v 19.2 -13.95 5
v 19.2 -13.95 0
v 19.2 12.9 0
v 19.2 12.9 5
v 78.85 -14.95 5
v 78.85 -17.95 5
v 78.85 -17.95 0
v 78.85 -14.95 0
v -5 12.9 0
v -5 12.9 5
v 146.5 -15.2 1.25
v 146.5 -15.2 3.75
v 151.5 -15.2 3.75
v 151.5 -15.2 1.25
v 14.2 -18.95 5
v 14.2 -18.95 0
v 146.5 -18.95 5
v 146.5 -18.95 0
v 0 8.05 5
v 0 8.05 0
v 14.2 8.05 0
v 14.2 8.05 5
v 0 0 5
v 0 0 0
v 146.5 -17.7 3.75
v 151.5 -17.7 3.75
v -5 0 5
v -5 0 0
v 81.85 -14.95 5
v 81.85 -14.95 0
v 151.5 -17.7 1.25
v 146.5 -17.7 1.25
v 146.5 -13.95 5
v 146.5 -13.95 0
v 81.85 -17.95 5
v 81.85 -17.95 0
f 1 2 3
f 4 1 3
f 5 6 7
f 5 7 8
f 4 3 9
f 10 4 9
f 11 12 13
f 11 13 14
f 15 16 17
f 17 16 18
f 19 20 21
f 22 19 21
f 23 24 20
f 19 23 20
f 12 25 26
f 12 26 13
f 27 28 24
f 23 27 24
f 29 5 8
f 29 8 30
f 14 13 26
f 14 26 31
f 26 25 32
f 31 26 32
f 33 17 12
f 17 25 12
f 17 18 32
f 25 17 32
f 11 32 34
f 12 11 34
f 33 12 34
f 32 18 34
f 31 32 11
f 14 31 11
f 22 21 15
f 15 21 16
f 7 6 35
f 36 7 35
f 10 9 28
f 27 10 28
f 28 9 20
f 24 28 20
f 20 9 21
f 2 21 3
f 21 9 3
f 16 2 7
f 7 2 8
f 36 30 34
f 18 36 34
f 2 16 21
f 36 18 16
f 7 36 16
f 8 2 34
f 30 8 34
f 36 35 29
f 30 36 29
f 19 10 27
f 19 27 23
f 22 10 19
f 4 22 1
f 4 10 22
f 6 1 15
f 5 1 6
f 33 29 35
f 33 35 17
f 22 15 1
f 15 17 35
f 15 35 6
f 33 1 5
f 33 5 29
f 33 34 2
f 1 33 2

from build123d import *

# Parameters (mm, degrees)
BOSS_EXTRUDE1_DEPTH = 5
SKETCH2_W           = 2.5
SKETCH2_H           = 2.5
BOSS_EXTRUDE2_DEPTH = 5
SKETCH3_W           = 3
SKETCH3_H           = 3
CUT_EXTRUDE1_DEPTH  = 21


with BuildPart() as part:
    # Sketch1 → Boss-Extrude1 (new body)
    with BuildSketch(Plane.XY):
        Polygon((0, 6.7), (0, 8.05), (5.5, 8.05), (14.2, 8.05), (14.2, -18.95), (146.5, -18.95), (146.5, -13.95), (19.2, -13.95), (19.2, 12.9), (5.5, 12.9), (-5, 12.9), (-5, 0), (0, 0), align=None)
    extrude(amount=BOSS_EXTRUDE1_DEPTH)

    # Sketch2 → Boss-Extrude2 (add)
    with BuildSketch(Plane(origin=(146.5, 0, 0), x_dir=(0, 0, -1), z_dir=(1, 0, 0))):
        with Locations((-2.5, -16.45)):
            Rectangle(SKETCH2_W, SKETCH2_H)
    extrude(amount=BOSS_EXTRUDE2_DEPTH)

    # Sketch3 → Cut-Extrude1 (cut)
    with BuildSketch(Plane.XY.offset(5)):
        with Locations((80.35, -16.45)):
            Rectangle(SKETCH3_W, SKETCH3_H)
    extrude(amount=-CUT_EXTRUDE1_DEPTH, mode=Mode.SUBTRACT)


solid = part.part
